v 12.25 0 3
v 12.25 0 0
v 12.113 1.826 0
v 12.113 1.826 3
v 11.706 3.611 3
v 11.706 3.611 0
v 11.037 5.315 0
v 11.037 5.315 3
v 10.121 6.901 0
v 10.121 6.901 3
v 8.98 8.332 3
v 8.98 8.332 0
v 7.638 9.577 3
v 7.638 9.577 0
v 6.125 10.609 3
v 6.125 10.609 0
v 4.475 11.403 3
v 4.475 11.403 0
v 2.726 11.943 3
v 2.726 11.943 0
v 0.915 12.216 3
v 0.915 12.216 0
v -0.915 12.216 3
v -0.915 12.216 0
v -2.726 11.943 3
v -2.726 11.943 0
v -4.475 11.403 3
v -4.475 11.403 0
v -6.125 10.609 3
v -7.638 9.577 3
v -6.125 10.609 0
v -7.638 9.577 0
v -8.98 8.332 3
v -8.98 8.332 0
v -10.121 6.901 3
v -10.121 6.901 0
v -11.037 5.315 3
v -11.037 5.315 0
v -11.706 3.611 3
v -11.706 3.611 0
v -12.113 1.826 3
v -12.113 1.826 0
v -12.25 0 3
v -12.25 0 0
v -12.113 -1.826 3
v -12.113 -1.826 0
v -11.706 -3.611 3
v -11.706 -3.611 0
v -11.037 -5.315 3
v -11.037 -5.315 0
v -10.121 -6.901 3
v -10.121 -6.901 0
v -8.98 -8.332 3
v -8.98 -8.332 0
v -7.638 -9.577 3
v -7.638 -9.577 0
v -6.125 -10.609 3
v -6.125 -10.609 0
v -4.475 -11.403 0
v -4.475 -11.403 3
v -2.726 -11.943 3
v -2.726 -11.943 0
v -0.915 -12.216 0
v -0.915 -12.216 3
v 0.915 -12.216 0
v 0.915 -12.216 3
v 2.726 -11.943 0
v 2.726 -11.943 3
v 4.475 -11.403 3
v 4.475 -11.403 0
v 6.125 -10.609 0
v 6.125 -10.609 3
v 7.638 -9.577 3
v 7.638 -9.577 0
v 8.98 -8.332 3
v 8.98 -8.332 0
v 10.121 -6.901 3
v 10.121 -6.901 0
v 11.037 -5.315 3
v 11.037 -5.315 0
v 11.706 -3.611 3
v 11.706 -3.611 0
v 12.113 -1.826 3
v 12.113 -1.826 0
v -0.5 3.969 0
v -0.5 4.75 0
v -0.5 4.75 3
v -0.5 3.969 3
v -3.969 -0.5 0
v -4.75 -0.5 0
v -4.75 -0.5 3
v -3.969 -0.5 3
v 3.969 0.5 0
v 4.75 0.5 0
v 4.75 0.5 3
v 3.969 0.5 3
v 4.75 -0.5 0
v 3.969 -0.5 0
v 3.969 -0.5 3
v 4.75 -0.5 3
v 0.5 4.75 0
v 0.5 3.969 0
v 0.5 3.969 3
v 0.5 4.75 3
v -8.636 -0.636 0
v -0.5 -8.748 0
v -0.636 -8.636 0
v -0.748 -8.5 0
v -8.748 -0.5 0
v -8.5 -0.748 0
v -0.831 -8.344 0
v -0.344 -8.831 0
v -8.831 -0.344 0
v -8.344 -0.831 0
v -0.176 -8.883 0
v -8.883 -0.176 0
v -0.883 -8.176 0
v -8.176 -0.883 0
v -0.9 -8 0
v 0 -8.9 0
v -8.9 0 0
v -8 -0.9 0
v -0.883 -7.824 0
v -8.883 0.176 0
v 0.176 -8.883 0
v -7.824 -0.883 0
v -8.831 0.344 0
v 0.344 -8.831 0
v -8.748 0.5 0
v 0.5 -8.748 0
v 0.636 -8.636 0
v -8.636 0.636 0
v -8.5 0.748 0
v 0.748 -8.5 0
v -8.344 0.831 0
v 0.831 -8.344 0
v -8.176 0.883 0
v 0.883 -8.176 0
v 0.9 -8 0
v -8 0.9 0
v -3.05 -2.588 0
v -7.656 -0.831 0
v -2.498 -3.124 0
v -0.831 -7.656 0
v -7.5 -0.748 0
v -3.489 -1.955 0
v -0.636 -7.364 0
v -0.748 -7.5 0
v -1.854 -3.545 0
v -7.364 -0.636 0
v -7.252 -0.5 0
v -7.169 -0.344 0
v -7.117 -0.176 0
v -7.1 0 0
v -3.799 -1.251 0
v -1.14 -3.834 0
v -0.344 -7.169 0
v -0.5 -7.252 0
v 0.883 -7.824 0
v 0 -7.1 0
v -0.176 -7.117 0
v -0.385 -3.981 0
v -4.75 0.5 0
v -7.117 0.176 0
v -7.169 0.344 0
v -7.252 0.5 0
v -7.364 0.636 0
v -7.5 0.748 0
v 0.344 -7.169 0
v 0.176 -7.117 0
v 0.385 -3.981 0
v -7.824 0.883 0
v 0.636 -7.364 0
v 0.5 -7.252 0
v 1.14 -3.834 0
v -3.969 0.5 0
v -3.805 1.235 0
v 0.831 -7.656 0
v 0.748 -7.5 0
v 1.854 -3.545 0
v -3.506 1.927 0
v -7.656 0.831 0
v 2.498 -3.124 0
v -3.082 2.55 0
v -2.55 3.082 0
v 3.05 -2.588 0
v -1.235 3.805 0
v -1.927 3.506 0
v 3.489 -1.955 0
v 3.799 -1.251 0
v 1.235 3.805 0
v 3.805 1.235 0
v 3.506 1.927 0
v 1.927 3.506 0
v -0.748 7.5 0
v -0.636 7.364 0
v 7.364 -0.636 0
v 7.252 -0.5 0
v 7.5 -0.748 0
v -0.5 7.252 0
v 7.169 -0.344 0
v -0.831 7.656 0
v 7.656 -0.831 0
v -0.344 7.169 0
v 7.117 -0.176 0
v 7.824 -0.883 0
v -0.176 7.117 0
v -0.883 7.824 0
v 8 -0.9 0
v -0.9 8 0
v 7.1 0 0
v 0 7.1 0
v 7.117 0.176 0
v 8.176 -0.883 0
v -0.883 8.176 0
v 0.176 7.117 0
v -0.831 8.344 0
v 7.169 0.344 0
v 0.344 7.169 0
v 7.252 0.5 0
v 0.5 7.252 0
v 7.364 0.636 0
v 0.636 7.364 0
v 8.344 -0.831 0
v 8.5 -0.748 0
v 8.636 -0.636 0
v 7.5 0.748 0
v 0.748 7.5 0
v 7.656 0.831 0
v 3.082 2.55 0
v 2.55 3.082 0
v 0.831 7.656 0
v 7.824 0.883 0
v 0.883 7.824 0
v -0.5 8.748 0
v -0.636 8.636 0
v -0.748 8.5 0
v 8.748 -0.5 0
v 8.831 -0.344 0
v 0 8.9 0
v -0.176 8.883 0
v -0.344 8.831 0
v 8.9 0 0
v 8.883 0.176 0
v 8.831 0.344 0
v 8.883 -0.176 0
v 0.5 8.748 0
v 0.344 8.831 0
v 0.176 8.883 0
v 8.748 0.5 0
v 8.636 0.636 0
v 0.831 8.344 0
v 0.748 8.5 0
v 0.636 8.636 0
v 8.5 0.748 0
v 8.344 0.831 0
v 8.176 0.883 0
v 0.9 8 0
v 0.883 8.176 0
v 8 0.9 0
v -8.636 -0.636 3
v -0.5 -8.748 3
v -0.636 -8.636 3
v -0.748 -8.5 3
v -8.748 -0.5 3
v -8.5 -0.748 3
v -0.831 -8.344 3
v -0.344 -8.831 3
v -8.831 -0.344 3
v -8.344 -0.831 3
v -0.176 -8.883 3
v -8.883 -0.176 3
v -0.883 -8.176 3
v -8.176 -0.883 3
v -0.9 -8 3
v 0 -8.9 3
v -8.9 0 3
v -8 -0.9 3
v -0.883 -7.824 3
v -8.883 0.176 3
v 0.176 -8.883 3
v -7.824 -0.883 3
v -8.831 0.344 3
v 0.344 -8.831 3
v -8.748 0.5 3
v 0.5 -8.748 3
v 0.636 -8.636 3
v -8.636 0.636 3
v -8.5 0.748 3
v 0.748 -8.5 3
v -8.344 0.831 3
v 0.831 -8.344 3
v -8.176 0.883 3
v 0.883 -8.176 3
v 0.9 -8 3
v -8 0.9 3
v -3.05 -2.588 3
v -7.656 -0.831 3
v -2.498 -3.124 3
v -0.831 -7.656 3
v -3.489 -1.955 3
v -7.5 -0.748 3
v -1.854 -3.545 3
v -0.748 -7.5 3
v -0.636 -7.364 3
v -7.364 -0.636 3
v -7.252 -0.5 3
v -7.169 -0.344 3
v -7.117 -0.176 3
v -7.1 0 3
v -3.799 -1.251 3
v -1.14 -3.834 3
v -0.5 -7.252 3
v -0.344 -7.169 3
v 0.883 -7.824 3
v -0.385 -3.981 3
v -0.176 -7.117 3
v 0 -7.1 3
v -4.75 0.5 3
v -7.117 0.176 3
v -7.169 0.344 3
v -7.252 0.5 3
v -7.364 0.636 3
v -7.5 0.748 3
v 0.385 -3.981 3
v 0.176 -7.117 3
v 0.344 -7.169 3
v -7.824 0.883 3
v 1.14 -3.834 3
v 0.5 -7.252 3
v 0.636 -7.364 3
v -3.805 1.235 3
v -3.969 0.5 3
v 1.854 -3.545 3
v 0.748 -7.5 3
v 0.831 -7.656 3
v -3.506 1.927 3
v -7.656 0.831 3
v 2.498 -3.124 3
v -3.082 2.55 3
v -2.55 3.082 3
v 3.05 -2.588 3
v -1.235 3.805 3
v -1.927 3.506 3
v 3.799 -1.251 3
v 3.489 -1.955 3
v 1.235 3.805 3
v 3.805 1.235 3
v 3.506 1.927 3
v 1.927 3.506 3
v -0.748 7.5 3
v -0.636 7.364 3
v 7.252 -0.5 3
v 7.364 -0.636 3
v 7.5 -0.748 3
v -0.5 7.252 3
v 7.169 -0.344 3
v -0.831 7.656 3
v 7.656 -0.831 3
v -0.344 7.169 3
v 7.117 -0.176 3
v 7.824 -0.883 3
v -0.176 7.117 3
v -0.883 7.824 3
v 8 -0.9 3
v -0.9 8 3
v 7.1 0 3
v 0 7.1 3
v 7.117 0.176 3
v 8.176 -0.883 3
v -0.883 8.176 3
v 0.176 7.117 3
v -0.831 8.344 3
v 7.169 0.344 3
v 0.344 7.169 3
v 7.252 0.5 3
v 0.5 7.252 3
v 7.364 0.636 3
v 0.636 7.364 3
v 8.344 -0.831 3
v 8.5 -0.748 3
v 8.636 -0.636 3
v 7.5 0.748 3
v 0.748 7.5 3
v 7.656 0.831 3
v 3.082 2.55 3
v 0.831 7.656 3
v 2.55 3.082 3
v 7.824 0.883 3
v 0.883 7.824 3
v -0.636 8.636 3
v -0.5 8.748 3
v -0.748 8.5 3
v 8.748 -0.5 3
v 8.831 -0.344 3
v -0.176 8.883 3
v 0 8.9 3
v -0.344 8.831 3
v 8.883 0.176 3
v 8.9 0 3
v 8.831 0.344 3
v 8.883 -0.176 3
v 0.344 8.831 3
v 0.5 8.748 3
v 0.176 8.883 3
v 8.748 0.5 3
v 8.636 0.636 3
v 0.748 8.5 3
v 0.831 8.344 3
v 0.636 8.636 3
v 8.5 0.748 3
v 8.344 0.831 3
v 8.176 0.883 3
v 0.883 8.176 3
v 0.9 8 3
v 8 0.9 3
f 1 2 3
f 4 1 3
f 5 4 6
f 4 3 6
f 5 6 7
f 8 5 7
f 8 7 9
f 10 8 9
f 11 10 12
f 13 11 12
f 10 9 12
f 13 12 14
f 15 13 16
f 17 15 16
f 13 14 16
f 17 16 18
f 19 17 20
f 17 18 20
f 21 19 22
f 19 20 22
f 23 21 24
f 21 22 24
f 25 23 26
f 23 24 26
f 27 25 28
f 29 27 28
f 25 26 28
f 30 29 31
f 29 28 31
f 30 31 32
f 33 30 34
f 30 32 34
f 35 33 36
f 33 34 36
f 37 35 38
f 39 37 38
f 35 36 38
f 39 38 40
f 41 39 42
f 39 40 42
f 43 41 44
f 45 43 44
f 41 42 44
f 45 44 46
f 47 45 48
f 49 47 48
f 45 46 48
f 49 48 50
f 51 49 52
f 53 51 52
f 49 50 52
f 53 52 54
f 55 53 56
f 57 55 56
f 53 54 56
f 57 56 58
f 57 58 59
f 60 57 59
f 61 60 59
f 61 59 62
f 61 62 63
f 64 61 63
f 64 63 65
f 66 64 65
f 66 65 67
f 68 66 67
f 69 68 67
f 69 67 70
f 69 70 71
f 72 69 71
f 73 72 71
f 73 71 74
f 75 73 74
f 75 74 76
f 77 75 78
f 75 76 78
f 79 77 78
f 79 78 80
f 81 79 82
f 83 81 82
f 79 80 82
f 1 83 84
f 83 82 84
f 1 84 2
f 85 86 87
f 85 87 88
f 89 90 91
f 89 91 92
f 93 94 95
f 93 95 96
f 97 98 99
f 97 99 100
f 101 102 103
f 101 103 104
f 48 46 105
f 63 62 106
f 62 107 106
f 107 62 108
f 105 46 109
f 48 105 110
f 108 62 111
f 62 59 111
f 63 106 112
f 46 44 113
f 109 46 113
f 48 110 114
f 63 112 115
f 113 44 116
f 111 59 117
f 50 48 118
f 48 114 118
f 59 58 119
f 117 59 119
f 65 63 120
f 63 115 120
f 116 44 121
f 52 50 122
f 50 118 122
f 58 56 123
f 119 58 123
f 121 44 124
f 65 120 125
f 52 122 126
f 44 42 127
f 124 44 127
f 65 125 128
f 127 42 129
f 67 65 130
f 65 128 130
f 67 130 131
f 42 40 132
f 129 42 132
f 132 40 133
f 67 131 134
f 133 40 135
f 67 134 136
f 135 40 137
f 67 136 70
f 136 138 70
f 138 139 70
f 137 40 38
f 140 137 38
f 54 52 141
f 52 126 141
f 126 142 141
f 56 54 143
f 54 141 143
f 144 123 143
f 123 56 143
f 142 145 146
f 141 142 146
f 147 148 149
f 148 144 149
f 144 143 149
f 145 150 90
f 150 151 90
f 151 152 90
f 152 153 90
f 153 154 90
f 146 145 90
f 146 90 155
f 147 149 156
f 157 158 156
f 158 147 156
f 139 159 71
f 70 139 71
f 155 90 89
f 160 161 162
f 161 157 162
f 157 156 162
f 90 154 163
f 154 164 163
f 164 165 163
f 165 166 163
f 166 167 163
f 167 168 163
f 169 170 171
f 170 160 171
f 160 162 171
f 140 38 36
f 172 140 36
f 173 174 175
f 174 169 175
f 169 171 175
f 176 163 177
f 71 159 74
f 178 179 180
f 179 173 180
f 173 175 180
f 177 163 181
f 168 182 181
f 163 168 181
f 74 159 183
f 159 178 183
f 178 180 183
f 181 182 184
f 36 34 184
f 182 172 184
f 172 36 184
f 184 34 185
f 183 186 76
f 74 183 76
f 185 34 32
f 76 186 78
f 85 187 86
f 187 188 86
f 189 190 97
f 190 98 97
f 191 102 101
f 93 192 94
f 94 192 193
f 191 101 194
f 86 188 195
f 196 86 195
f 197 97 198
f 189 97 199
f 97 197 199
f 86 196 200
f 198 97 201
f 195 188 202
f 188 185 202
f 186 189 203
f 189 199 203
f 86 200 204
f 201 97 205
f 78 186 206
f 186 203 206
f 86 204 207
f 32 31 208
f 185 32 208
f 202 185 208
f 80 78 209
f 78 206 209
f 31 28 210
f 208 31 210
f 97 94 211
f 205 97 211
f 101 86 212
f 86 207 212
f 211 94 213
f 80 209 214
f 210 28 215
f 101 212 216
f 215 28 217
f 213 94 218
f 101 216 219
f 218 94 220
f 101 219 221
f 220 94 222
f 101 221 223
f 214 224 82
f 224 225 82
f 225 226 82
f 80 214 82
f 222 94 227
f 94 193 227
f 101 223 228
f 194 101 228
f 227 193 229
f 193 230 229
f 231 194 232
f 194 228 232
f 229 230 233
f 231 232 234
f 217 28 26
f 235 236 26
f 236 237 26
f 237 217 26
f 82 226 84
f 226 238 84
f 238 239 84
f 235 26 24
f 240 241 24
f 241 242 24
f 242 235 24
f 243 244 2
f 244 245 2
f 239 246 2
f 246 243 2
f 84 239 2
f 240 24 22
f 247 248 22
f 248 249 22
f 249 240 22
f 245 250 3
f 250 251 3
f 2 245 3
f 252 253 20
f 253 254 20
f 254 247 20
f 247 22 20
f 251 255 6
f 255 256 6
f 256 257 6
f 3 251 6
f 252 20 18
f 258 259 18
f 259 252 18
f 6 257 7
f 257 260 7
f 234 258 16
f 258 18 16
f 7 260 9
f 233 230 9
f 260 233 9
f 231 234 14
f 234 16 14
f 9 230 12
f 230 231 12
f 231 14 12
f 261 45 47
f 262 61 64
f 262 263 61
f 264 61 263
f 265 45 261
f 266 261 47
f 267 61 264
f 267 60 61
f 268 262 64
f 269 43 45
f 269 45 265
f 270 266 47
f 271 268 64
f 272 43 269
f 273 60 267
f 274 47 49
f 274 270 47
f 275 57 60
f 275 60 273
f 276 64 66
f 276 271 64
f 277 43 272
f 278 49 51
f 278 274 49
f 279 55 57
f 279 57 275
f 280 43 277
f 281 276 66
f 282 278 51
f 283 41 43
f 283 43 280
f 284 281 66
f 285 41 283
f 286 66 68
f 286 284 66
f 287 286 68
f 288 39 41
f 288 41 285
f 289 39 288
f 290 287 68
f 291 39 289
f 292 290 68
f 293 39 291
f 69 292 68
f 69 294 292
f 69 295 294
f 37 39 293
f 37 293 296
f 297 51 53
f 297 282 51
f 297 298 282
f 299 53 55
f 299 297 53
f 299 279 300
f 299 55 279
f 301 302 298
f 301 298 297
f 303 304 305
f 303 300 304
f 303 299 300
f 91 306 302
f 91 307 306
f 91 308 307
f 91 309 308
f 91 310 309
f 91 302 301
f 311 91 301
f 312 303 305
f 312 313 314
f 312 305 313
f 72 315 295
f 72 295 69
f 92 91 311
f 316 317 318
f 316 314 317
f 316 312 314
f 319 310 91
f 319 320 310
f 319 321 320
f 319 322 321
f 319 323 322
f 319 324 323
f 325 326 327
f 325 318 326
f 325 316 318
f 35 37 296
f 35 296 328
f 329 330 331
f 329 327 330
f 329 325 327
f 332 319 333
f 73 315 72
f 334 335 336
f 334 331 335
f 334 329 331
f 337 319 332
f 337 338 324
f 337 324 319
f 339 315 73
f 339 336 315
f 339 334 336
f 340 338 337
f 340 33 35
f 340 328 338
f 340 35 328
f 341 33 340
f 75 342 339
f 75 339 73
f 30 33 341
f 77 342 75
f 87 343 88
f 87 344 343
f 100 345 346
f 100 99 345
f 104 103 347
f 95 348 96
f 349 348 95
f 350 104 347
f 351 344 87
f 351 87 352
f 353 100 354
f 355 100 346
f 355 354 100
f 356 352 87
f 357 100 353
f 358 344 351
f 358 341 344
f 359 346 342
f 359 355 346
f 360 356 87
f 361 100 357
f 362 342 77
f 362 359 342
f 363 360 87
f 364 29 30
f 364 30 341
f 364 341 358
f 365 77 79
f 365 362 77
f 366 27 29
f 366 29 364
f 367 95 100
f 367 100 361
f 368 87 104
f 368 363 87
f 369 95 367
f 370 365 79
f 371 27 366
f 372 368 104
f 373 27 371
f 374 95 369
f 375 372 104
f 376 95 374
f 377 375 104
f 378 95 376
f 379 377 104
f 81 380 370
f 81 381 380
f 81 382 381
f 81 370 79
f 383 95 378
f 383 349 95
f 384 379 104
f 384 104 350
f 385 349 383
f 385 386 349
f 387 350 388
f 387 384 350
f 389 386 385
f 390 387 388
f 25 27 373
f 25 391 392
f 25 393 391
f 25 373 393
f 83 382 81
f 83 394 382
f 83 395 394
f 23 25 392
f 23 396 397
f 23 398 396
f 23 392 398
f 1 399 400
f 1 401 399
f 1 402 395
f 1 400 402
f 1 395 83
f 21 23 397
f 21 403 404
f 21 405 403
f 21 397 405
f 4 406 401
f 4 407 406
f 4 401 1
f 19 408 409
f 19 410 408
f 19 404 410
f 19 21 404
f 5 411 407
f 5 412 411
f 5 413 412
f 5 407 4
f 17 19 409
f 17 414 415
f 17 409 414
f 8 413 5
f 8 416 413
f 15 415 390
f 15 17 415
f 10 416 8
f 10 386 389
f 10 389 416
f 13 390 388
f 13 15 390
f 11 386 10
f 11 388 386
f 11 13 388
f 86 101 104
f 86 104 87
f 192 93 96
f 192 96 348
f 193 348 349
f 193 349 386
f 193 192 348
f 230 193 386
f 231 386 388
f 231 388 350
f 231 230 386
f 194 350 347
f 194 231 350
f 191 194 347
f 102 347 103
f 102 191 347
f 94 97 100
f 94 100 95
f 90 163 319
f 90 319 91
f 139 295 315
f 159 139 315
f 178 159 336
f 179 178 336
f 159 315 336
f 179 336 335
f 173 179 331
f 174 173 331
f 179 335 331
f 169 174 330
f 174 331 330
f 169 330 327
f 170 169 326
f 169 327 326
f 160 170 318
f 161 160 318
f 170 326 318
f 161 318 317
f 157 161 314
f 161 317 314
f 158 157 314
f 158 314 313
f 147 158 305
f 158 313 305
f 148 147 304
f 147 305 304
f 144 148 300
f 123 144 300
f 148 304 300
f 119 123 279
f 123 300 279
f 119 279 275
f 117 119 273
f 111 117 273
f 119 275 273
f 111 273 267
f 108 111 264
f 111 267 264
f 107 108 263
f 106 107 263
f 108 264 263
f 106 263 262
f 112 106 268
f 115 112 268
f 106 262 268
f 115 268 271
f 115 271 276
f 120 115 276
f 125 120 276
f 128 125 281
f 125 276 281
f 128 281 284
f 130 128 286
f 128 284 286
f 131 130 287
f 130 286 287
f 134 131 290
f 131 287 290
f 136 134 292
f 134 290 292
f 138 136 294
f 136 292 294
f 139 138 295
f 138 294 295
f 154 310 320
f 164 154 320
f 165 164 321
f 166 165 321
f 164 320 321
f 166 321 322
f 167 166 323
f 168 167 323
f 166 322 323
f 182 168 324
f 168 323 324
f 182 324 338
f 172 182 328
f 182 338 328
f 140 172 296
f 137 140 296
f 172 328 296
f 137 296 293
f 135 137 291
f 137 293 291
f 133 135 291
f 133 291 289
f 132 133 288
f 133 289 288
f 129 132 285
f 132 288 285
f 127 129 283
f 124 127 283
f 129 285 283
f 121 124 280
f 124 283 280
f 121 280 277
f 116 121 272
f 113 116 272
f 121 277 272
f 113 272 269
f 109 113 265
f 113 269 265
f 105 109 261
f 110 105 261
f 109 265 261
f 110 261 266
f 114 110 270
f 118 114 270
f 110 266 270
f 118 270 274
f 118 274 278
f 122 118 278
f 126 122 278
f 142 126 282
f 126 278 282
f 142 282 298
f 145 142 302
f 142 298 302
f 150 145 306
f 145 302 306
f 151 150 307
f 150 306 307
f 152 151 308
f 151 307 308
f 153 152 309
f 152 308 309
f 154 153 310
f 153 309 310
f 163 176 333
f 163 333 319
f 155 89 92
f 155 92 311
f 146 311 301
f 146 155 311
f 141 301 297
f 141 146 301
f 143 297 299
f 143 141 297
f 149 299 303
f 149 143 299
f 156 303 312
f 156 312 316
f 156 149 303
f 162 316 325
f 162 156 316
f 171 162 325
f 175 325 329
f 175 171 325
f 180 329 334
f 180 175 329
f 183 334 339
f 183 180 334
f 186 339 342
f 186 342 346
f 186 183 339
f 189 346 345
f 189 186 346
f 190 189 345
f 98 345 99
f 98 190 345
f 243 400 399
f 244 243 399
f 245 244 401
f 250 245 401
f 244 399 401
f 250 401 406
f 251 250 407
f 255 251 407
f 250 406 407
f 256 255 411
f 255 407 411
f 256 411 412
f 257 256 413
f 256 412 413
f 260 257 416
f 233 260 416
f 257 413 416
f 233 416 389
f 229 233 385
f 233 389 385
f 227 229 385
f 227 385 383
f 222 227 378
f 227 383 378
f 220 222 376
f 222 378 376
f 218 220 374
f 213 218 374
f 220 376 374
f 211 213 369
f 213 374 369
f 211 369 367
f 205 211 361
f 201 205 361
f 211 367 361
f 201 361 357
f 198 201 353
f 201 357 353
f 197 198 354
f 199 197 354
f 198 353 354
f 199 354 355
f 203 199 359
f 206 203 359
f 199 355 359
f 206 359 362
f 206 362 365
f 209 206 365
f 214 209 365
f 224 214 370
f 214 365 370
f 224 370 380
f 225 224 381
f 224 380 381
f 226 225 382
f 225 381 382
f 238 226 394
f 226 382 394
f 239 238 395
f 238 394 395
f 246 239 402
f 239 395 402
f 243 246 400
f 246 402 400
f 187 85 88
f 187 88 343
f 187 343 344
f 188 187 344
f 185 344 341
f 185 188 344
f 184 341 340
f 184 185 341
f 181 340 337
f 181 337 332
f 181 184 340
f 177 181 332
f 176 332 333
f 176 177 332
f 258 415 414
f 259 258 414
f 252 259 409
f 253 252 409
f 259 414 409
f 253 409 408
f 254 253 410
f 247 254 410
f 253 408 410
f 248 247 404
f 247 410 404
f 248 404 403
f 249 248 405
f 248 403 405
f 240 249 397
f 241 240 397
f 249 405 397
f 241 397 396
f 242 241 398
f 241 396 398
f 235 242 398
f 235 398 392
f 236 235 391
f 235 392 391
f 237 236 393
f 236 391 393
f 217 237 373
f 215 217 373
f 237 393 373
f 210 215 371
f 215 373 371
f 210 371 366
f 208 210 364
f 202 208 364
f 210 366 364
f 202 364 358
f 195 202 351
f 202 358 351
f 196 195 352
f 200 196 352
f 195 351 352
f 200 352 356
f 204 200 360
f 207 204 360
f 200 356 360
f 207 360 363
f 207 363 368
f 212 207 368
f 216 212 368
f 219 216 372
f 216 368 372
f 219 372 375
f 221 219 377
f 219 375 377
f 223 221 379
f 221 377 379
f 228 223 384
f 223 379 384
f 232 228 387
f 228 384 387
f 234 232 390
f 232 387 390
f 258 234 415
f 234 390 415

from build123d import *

# Parameters (mm, degrees)
BOSS_EXTRUDE1_DEPTH = 3
CUT_EXTRUDE1_START  = -3
CUT_EXTRUDE1_DEPTH  = 3
SKETCH5_R           = 0.9
CUT_EXTRUDE2_DEPTH  = 3


with BuildPart() as part:
    # Sketch1 → Boss-Extrude1 (new body)
    with BuildSketch(Plane.XY):
        with BuildLine():
            ThreePointArc((4, 0), (2.747276725, -2.907313295), (-0.226235298, -3.993597074))
            Line((-0.226235298, -3.993597074), (-0.6928456, -12.230391039))
            ThreePointArc((-0.6928456, -12.230391039), (8.41353497, -8.903646966), (12.25, 0))
            ThreePointArc((12.25, 0), (-5.47503582, 10.958397819), (-7.35595637, -9.795529893))
            Line((-7.35595637, -9.795529893), (-2.401944937, -3.198540373))
            ThreePointArc((-2.401944937, -3.198540373), (-1.787766798, 3.578252349), (4, 0))
        make_face()
        with BuildLine():
            Line((-0.6928456, -12.230391039), (-0.226235298, -3.993597074))
            ThreePointArc((-0.226235298, -3.993597074), (-1.372902628, -3.757011894), (-2.401944937, -3.198540373))
            Line((-2.401944937, -3.198540373), (-7.35595637, -9.795529893))
            ThreePointArc((-7.35595637, -9.795529893), (-4.204514299, -11.505848926), (-0.6928456, -12.230391039))
        make_face()
        with BuildLine():
            Line((-0.226235298, -3.993597074), (-0.6928456, -12.230391039))
            ThreePointArc((-0.6928456, -12.230391039), (4.204514299, 11.505848926), (-7.35595637, -9.795529893))
            Line((-7.35595637, -9.795529893), (-2.401944937, -3.198540373))
            ThreePointArc((-2.401944937, -3.198540373), (1.372902628, 3.757011894), (-0.226235298, -3.993597074))
        make_face()
    extrude(amount=BOSS_EXTRUDE1_DEPTH)

    # Sketch2 → Cut-Extrude1 (cut)
    with BuildSketch(Plane.XY.offset(3).offset(CUT_EXTRUDE1_START)):
        with BuildLine():
            Line((-3.968626967, 0.5), (-4.75, 0.5))
            Line((-4.75, 0.5), (-4.75, -0.5))
            Line((-4.75, -0.5), (-3.968626967, -0.5))
            ThreePointArc((-3.968626967, -0.5), (-4, 0), (-3.968626967, 0.5))
        make_face()
        with BuildLine():
            Line((-0.5, 4.75), (-0.5, 3.968626967))
            ThreePointArc((-0.5, 3.968626967), (0, 4), (0.5, 3.968626967))
            Line((0.5, 3.968626967), (0.5, 4.75))
            Line((0.5, 4.75), (-0.5, 4.75))
        make_face()
        with BuildLine():
            ThreePointArc((3.968626967, 0.5), (4, 0), (3.968626967, -0.5))
            Line((3.968626967, -0.5), (4.75, -0.5))
            Line((4.75, -0.5), (4.75, 0.5))
            Line((4.75, 0.5), (3.968626967, 0.5))
        make_face()
    extrude(amount=CUT_EXTRUDE1_DEPTH, mode=Mode.SUBTRACT)

    # Sketch5 → Cut-Extrude2 (cut)
    with BuildSketch(Plane.XY.offset(3)):
        with Locations((0, -8)):
            Circle(SKETCH5_R)
        with Locations((-8, 0)):
            Circle(SKETCH5_R)
        with Locations((0, 8)):
            Circle(SKETCH5_R)
        with Locations((8, 0)):
            Circle(SKETCH5_R)
    extrude(amount=-CUT_EXTRUDE2_DEPTH, mode=Mode.SUBTRACT)


solid = part.part
